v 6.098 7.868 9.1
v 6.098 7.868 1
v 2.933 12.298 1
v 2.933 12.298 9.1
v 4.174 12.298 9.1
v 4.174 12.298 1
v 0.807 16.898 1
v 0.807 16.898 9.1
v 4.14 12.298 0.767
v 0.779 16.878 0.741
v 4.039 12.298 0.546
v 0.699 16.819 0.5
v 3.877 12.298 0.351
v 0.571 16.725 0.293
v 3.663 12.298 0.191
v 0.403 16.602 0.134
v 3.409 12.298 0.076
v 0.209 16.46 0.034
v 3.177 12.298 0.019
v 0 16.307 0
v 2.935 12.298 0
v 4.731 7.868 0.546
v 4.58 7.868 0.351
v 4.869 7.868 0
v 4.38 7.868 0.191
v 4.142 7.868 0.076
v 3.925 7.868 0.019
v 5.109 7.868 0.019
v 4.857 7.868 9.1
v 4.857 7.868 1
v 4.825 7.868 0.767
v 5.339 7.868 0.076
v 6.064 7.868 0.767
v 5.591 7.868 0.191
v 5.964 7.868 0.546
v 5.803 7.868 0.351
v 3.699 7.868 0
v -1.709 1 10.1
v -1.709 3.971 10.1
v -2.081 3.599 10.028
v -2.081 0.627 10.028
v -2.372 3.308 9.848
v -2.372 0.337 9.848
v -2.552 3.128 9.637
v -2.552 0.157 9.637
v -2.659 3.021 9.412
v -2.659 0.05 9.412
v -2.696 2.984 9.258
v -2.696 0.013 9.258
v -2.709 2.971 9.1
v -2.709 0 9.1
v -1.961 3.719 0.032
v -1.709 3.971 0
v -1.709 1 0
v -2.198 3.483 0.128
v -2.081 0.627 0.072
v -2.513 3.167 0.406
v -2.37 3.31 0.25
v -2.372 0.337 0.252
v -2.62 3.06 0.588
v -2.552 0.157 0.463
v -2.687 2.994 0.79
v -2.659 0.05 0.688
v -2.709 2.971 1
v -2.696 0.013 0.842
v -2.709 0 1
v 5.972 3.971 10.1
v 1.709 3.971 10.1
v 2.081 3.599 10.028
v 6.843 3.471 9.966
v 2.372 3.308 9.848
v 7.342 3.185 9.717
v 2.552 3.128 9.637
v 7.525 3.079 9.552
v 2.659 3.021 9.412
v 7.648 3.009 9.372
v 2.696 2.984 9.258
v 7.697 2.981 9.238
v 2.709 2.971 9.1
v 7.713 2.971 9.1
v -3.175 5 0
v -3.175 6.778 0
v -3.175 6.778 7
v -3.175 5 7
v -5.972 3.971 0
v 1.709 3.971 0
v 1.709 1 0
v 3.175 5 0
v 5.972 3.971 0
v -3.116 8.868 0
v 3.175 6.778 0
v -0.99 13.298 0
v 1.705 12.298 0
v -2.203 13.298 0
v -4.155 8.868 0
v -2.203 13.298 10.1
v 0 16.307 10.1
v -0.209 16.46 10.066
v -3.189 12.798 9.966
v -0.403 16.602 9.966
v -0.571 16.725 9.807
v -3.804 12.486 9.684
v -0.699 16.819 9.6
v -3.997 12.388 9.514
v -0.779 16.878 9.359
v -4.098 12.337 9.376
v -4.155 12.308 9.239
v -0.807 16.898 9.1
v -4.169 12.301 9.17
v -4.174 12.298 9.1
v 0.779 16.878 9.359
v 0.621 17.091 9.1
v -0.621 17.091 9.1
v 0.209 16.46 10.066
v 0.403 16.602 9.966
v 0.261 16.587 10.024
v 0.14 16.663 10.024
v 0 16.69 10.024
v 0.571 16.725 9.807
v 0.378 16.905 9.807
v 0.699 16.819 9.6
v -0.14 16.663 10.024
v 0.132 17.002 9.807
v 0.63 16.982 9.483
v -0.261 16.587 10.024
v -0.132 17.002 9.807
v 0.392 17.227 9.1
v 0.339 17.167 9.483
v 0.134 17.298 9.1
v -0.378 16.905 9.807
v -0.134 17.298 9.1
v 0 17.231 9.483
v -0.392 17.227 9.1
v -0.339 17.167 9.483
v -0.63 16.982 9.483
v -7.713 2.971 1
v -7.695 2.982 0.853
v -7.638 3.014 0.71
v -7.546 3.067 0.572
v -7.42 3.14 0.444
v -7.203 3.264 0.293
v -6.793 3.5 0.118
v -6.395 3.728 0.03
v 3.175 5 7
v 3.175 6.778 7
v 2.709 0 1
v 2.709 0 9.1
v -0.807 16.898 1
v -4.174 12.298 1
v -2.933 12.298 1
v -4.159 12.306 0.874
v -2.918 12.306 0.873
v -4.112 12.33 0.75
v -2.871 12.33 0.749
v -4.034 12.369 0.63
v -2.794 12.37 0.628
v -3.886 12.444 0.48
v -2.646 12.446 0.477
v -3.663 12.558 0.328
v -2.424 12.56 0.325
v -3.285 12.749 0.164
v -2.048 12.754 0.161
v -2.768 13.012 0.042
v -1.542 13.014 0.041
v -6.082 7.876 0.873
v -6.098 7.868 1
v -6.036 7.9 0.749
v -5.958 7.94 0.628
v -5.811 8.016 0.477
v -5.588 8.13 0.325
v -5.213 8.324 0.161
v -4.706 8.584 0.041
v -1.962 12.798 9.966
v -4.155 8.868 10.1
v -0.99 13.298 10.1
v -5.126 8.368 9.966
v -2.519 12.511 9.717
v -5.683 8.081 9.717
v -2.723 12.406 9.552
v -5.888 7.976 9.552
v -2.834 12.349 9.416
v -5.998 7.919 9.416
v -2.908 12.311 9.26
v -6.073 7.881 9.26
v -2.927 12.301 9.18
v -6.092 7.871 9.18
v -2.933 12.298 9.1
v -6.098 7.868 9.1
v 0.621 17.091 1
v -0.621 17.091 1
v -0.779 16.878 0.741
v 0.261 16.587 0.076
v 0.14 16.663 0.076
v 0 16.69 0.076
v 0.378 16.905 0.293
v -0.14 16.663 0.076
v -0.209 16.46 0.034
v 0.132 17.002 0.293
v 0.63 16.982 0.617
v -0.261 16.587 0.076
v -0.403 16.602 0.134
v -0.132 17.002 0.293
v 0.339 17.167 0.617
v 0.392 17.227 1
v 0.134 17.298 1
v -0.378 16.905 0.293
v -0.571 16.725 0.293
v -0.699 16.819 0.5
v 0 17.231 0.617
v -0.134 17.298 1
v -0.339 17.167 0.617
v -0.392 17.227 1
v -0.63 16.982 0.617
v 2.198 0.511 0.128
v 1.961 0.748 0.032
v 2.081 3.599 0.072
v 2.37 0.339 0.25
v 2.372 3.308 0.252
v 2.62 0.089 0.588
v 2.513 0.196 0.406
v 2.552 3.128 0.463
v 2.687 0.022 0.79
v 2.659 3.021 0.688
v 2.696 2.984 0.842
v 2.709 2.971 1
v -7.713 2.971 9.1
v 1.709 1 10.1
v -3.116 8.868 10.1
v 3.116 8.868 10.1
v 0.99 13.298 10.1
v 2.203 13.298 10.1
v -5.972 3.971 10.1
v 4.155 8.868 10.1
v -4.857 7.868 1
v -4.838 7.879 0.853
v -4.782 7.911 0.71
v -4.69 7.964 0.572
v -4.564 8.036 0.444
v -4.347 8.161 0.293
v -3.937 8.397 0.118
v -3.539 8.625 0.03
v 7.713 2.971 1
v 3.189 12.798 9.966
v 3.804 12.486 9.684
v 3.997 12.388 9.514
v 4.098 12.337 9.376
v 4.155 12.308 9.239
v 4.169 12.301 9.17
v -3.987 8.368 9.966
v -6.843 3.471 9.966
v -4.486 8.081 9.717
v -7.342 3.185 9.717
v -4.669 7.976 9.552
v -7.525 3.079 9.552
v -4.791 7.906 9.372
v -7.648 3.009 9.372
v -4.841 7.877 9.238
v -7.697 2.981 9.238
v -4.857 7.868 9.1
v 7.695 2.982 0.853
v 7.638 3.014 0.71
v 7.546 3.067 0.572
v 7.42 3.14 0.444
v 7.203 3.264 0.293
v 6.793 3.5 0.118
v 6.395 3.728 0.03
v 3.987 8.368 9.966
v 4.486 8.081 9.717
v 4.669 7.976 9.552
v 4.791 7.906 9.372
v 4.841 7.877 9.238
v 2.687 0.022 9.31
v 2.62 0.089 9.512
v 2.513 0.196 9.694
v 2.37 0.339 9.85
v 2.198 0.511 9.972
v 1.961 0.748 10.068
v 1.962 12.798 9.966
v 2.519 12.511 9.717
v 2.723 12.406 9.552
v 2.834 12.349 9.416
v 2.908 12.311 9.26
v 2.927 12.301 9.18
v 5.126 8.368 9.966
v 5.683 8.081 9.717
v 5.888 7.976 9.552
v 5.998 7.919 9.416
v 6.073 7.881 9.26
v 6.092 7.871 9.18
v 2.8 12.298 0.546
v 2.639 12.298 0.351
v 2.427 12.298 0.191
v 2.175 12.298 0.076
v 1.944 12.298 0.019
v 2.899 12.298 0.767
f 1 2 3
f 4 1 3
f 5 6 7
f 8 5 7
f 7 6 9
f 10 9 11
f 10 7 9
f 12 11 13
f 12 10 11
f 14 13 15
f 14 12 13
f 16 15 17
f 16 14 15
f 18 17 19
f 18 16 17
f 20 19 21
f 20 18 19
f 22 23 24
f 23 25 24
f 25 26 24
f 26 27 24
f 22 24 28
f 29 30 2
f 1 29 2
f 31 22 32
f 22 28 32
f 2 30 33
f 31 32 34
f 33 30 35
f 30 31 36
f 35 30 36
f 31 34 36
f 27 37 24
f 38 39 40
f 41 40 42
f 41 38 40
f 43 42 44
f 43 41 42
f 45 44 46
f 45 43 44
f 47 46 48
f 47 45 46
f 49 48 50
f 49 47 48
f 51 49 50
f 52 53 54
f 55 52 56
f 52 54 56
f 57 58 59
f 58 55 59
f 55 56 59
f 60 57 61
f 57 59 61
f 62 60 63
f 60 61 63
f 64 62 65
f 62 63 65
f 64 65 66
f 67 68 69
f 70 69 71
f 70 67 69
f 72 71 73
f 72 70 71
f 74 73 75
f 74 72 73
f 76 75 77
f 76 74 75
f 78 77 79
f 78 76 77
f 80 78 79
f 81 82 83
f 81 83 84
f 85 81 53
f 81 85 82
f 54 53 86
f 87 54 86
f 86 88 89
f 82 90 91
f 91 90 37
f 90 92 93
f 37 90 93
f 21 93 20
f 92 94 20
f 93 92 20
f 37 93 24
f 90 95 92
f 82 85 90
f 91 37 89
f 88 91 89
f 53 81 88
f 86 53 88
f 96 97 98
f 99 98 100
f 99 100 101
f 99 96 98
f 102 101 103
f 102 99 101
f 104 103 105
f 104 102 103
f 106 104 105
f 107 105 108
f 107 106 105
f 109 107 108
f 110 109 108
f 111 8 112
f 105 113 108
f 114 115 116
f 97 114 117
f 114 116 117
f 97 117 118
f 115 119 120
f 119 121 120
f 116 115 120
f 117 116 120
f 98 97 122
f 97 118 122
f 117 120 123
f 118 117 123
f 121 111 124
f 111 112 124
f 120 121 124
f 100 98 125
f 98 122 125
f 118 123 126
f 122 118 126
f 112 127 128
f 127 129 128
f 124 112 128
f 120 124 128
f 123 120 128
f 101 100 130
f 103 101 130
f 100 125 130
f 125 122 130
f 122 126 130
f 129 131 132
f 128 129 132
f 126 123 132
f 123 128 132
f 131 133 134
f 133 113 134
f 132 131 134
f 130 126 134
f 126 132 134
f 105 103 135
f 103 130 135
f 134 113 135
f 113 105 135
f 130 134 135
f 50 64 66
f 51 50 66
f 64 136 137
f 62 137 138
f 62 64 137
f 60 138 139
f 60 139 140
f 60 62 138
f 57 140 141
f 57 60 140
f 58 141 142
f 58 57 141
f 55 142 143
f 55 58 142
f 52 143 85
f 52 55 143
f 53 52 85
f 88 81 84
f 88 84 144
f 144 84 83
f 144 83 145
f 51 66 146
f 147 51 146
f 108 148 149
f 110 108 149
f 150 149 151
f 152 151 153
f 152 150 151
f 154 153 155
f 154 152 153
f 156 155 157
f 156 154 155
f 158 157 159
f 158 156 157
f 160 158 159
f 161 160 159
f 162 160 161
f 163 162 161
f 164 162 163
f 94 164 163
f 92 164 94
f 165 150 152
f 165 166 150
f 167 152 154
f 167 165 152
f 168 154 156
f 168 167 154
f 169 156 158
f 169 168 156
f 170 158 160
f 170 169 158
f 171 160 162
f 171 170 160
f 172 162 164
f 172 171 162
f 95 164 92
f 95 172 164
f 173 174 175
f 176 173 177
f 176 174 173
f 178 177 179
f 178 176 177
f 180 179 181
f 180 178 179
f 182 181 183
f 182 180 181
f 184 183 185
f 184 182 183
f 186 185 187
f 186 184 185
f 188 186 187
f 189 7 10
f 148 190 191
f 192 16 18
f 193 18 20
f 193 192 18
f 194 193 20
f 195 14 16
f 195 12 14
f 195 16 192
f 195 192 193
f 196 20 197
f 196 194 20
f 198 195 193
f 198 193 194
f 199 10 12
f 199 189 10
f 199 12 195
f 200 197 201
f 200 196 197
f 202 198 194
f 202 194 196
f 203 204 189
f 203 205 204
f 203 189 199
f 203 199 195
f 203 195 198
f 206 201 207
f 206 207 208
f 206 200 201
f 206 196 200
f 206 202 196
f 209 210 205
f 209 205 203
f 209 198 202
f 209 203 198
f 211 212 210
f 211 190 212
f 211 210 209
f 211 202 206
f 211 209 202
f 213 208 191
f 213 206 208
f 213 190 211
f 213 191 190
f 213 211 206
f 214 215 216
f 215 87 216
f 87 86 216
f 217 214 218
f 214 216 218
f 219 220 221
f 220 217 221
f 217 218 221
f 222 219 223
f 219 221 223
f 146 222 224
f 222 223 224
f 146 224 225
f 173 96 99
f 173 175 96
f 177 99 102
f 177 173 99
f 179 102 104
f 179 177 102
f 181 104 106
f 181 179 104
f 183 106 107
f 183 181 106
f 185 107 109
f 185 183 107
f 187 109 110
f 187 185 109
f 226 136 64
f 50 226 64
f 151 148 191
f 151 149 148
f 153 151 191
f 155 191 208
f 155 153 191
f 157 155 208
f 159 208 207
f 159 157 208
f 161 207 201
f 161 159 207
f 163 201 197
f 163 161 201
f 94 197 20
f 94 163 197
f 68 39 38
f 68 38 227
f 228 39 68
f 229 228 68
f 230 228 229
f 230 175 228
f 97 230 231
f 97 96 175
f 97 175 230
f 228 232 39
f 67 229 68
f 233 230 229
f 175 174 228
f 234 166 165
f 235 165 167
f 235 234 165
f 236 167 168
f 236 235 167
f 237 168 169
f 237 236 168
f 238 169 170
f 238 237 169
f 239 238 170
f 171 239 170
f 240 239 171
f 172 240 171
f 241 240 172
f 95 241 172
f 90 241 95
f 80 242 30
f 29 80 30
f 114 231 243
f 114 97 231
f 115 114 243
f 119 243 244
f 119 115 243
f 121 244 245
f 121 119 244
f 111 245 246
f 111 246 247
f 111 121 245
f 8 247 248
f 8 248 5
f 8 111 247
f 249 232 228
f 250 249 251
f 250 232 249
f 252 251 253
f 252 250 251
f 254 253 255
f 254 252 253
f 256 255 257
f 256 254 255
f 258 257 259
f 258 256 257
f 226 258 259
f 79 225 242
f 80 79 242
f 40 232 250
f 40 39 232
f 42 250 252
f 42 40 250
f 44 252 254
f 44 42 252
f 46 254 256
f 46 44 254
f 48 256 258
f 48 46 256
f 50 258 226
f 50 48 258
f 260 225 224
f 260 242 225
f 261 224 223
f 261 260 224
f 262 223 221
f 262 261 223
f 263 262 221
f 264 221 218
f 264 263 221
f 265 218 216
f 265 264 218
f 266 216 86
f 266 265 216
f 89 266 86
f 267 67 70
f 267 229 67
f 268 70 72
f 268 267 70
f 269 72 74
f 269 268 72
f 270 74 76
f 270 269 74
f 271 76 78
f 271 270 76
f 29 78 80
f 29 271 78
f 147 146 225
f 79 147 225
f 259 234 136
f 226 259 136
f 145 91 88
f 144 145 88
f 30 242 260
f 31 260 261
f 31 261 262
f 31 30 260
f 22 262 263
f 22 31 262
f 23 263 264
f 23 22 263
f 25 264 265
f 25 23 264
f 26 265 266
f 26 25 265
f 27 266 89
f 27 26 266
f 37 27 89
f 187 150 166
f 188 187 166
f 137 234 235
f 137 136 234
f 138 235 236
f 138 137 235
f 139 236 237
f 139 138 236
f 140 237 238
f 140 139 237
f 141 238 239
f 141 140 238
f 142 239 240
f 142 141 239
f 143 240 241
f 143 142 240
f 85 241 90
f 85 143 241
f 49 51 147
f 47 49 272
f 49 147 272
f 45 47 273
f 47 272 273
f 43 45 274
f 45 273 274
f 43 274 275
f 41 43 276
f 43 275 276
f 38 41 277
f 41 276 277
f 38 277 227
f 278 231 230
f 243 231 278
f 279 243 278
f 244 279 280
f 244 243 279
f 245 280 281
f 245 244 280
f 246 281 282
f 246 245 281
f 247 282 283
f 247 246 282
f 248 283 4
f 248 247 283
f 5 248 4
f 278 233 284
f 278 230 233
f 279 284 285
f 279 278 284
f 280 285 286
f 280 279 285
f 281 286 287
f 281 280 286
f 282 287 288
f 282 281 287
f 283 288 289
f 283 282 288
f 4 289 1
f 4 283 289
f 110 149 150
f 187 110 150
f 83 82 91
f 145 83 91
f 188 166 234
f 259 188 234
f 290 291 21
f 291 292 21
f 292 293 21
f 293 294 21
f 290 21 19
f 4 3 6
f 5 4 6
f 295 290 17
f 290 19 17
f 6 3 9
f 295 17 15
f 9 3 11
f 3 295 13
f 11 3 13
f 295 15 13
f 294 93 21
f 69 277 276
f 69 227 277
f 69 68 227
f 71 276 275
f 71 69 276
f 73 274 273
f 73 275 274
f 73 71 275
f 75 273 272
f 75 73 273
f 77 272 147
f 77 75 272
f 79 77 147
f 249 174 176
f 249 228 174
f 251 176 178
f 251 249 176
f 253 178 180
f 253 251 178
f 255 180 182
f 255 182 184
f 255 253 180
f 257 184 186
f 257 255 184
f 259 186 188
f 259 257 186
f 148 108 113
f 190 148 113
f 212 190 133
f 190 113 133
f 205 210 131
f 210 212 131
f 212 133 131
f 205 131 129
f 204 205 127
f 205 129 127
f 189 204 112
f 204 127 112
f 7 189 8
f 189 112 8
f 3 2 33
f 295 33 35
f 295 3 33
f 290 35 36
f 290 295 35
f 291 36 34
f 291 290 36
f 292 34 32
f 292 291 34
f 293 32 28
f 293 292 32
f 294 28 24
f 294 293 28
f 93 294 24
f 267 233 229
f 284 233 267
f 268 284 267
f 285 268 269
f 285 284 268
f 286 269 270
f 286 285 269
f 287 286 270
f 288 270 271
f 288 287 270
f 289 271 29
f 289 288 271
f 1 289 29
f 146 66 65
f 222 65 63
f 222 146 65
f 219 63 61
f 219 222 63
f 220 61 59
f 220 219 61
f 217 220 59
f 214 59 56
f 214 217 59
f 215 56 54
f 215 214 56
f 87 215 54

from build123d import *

# Parameters (mm, degrees)
F1_DEPTH = 10.1
F2_W     = 6.35
F2_H     = 1.778
F3_DEPTH = 4.318
F4_DEPTH = 7
F6_R     = 1


with BuildPart() as f1:
    # F0 (on Top) → F1 (new body)
    with BuildSketch(Plane.XY):
        Polygon((-2.708949, 0), (0, 0), (2.708949, 0), (2.708949, 2.971315), (7.713426, 2.971315), (4.857096, 7.86788), (6.097892, 7.86788), (2.933446, 12.298105), (4.174241, 12.298105), (0, 18), (-4.174241, 12.298105), (-2.933446, 12.298105), (-6.097892, 7.86788), (-4.857096, 7.86788), (-7.713426, 2.971315), (-2.708949, 2.971315), align=None)
    extrude(amount=F1_DEPTH)

    # F2 (on face) → F3 (cut)
    with BuildSketch(Plane(origin=(0, 0, 0), x_dir=(1, 0, 0), z_dir=(0, 0, -1))):
        with Locations((0, -5.889)):
            Rectangle(F2_W, F2_H)
    extrude(amount=-F3_DEPTH, mode=Mode.SUBTRACT)

    # F2 (on face) → F4 (cut)
    with BuildSketch(Plane(origin=(0, 0, 0), x_dir=(1, 0, 0), z_dir=(0, 0, -1))):
        with Locations((0, -5.889)):
            Rectangle(F2_W, F2_H)
    extrude(amount=-F4_DEPTH, mode=Mode.SUBTRACT)

    # F6
    f6_edges = [f1.edges().sort_by_distance(p)[0] for p in [
        (0, 18, 5.05),
        (-6.285261, 5.419597, 10.1),
        (-5.211187, 2.971315, 10.1),
        (-2.708949, 1.485657, 10.1),
        (0, 0, 10.1),
        (2.708949, 1.485657, 10.1),
        (5.211187, 2.971315, 10.1),
        (6.285261, 5.419597, 10.1),
        (5.477494, 7.86788, 10.1),
        (4.515669, 10.082993, 10.1),
        (3.553843, 12.298105, 10.1),
        (2.087121, 15.149053, 10.1),
        (-2.087121, 15.149053, 10.1),
        (-3.553843, 12.298105, 10.1),
        (-4.515669, 10.082993, 10.1),
        (-5.477494, 7.86788, 10.1),
        (4.515669, 10.082993, 0),
        (2.087121, 15.149053, 0),
        (-2.087121, 15.149053, 0),
        (-4.515669, 10.082993, 0),
        (-3.553843, 12.298105, 0),
        (-6.285261, 5.419597, 0),
        (-5.477494, 7.86788, 0),
        (-5.211187, 2.971315, 0),
        (-2.708949, 1.485657, 0),
        (0, 0, 0),
        (2.708949, 1.485657, 0),
        (5.211187, 2.971315, 0),
        (6.285261, 5.419597, 0),
    ]]
    fillet(f6_edges, radius=F6_R)


solid = f1.part
